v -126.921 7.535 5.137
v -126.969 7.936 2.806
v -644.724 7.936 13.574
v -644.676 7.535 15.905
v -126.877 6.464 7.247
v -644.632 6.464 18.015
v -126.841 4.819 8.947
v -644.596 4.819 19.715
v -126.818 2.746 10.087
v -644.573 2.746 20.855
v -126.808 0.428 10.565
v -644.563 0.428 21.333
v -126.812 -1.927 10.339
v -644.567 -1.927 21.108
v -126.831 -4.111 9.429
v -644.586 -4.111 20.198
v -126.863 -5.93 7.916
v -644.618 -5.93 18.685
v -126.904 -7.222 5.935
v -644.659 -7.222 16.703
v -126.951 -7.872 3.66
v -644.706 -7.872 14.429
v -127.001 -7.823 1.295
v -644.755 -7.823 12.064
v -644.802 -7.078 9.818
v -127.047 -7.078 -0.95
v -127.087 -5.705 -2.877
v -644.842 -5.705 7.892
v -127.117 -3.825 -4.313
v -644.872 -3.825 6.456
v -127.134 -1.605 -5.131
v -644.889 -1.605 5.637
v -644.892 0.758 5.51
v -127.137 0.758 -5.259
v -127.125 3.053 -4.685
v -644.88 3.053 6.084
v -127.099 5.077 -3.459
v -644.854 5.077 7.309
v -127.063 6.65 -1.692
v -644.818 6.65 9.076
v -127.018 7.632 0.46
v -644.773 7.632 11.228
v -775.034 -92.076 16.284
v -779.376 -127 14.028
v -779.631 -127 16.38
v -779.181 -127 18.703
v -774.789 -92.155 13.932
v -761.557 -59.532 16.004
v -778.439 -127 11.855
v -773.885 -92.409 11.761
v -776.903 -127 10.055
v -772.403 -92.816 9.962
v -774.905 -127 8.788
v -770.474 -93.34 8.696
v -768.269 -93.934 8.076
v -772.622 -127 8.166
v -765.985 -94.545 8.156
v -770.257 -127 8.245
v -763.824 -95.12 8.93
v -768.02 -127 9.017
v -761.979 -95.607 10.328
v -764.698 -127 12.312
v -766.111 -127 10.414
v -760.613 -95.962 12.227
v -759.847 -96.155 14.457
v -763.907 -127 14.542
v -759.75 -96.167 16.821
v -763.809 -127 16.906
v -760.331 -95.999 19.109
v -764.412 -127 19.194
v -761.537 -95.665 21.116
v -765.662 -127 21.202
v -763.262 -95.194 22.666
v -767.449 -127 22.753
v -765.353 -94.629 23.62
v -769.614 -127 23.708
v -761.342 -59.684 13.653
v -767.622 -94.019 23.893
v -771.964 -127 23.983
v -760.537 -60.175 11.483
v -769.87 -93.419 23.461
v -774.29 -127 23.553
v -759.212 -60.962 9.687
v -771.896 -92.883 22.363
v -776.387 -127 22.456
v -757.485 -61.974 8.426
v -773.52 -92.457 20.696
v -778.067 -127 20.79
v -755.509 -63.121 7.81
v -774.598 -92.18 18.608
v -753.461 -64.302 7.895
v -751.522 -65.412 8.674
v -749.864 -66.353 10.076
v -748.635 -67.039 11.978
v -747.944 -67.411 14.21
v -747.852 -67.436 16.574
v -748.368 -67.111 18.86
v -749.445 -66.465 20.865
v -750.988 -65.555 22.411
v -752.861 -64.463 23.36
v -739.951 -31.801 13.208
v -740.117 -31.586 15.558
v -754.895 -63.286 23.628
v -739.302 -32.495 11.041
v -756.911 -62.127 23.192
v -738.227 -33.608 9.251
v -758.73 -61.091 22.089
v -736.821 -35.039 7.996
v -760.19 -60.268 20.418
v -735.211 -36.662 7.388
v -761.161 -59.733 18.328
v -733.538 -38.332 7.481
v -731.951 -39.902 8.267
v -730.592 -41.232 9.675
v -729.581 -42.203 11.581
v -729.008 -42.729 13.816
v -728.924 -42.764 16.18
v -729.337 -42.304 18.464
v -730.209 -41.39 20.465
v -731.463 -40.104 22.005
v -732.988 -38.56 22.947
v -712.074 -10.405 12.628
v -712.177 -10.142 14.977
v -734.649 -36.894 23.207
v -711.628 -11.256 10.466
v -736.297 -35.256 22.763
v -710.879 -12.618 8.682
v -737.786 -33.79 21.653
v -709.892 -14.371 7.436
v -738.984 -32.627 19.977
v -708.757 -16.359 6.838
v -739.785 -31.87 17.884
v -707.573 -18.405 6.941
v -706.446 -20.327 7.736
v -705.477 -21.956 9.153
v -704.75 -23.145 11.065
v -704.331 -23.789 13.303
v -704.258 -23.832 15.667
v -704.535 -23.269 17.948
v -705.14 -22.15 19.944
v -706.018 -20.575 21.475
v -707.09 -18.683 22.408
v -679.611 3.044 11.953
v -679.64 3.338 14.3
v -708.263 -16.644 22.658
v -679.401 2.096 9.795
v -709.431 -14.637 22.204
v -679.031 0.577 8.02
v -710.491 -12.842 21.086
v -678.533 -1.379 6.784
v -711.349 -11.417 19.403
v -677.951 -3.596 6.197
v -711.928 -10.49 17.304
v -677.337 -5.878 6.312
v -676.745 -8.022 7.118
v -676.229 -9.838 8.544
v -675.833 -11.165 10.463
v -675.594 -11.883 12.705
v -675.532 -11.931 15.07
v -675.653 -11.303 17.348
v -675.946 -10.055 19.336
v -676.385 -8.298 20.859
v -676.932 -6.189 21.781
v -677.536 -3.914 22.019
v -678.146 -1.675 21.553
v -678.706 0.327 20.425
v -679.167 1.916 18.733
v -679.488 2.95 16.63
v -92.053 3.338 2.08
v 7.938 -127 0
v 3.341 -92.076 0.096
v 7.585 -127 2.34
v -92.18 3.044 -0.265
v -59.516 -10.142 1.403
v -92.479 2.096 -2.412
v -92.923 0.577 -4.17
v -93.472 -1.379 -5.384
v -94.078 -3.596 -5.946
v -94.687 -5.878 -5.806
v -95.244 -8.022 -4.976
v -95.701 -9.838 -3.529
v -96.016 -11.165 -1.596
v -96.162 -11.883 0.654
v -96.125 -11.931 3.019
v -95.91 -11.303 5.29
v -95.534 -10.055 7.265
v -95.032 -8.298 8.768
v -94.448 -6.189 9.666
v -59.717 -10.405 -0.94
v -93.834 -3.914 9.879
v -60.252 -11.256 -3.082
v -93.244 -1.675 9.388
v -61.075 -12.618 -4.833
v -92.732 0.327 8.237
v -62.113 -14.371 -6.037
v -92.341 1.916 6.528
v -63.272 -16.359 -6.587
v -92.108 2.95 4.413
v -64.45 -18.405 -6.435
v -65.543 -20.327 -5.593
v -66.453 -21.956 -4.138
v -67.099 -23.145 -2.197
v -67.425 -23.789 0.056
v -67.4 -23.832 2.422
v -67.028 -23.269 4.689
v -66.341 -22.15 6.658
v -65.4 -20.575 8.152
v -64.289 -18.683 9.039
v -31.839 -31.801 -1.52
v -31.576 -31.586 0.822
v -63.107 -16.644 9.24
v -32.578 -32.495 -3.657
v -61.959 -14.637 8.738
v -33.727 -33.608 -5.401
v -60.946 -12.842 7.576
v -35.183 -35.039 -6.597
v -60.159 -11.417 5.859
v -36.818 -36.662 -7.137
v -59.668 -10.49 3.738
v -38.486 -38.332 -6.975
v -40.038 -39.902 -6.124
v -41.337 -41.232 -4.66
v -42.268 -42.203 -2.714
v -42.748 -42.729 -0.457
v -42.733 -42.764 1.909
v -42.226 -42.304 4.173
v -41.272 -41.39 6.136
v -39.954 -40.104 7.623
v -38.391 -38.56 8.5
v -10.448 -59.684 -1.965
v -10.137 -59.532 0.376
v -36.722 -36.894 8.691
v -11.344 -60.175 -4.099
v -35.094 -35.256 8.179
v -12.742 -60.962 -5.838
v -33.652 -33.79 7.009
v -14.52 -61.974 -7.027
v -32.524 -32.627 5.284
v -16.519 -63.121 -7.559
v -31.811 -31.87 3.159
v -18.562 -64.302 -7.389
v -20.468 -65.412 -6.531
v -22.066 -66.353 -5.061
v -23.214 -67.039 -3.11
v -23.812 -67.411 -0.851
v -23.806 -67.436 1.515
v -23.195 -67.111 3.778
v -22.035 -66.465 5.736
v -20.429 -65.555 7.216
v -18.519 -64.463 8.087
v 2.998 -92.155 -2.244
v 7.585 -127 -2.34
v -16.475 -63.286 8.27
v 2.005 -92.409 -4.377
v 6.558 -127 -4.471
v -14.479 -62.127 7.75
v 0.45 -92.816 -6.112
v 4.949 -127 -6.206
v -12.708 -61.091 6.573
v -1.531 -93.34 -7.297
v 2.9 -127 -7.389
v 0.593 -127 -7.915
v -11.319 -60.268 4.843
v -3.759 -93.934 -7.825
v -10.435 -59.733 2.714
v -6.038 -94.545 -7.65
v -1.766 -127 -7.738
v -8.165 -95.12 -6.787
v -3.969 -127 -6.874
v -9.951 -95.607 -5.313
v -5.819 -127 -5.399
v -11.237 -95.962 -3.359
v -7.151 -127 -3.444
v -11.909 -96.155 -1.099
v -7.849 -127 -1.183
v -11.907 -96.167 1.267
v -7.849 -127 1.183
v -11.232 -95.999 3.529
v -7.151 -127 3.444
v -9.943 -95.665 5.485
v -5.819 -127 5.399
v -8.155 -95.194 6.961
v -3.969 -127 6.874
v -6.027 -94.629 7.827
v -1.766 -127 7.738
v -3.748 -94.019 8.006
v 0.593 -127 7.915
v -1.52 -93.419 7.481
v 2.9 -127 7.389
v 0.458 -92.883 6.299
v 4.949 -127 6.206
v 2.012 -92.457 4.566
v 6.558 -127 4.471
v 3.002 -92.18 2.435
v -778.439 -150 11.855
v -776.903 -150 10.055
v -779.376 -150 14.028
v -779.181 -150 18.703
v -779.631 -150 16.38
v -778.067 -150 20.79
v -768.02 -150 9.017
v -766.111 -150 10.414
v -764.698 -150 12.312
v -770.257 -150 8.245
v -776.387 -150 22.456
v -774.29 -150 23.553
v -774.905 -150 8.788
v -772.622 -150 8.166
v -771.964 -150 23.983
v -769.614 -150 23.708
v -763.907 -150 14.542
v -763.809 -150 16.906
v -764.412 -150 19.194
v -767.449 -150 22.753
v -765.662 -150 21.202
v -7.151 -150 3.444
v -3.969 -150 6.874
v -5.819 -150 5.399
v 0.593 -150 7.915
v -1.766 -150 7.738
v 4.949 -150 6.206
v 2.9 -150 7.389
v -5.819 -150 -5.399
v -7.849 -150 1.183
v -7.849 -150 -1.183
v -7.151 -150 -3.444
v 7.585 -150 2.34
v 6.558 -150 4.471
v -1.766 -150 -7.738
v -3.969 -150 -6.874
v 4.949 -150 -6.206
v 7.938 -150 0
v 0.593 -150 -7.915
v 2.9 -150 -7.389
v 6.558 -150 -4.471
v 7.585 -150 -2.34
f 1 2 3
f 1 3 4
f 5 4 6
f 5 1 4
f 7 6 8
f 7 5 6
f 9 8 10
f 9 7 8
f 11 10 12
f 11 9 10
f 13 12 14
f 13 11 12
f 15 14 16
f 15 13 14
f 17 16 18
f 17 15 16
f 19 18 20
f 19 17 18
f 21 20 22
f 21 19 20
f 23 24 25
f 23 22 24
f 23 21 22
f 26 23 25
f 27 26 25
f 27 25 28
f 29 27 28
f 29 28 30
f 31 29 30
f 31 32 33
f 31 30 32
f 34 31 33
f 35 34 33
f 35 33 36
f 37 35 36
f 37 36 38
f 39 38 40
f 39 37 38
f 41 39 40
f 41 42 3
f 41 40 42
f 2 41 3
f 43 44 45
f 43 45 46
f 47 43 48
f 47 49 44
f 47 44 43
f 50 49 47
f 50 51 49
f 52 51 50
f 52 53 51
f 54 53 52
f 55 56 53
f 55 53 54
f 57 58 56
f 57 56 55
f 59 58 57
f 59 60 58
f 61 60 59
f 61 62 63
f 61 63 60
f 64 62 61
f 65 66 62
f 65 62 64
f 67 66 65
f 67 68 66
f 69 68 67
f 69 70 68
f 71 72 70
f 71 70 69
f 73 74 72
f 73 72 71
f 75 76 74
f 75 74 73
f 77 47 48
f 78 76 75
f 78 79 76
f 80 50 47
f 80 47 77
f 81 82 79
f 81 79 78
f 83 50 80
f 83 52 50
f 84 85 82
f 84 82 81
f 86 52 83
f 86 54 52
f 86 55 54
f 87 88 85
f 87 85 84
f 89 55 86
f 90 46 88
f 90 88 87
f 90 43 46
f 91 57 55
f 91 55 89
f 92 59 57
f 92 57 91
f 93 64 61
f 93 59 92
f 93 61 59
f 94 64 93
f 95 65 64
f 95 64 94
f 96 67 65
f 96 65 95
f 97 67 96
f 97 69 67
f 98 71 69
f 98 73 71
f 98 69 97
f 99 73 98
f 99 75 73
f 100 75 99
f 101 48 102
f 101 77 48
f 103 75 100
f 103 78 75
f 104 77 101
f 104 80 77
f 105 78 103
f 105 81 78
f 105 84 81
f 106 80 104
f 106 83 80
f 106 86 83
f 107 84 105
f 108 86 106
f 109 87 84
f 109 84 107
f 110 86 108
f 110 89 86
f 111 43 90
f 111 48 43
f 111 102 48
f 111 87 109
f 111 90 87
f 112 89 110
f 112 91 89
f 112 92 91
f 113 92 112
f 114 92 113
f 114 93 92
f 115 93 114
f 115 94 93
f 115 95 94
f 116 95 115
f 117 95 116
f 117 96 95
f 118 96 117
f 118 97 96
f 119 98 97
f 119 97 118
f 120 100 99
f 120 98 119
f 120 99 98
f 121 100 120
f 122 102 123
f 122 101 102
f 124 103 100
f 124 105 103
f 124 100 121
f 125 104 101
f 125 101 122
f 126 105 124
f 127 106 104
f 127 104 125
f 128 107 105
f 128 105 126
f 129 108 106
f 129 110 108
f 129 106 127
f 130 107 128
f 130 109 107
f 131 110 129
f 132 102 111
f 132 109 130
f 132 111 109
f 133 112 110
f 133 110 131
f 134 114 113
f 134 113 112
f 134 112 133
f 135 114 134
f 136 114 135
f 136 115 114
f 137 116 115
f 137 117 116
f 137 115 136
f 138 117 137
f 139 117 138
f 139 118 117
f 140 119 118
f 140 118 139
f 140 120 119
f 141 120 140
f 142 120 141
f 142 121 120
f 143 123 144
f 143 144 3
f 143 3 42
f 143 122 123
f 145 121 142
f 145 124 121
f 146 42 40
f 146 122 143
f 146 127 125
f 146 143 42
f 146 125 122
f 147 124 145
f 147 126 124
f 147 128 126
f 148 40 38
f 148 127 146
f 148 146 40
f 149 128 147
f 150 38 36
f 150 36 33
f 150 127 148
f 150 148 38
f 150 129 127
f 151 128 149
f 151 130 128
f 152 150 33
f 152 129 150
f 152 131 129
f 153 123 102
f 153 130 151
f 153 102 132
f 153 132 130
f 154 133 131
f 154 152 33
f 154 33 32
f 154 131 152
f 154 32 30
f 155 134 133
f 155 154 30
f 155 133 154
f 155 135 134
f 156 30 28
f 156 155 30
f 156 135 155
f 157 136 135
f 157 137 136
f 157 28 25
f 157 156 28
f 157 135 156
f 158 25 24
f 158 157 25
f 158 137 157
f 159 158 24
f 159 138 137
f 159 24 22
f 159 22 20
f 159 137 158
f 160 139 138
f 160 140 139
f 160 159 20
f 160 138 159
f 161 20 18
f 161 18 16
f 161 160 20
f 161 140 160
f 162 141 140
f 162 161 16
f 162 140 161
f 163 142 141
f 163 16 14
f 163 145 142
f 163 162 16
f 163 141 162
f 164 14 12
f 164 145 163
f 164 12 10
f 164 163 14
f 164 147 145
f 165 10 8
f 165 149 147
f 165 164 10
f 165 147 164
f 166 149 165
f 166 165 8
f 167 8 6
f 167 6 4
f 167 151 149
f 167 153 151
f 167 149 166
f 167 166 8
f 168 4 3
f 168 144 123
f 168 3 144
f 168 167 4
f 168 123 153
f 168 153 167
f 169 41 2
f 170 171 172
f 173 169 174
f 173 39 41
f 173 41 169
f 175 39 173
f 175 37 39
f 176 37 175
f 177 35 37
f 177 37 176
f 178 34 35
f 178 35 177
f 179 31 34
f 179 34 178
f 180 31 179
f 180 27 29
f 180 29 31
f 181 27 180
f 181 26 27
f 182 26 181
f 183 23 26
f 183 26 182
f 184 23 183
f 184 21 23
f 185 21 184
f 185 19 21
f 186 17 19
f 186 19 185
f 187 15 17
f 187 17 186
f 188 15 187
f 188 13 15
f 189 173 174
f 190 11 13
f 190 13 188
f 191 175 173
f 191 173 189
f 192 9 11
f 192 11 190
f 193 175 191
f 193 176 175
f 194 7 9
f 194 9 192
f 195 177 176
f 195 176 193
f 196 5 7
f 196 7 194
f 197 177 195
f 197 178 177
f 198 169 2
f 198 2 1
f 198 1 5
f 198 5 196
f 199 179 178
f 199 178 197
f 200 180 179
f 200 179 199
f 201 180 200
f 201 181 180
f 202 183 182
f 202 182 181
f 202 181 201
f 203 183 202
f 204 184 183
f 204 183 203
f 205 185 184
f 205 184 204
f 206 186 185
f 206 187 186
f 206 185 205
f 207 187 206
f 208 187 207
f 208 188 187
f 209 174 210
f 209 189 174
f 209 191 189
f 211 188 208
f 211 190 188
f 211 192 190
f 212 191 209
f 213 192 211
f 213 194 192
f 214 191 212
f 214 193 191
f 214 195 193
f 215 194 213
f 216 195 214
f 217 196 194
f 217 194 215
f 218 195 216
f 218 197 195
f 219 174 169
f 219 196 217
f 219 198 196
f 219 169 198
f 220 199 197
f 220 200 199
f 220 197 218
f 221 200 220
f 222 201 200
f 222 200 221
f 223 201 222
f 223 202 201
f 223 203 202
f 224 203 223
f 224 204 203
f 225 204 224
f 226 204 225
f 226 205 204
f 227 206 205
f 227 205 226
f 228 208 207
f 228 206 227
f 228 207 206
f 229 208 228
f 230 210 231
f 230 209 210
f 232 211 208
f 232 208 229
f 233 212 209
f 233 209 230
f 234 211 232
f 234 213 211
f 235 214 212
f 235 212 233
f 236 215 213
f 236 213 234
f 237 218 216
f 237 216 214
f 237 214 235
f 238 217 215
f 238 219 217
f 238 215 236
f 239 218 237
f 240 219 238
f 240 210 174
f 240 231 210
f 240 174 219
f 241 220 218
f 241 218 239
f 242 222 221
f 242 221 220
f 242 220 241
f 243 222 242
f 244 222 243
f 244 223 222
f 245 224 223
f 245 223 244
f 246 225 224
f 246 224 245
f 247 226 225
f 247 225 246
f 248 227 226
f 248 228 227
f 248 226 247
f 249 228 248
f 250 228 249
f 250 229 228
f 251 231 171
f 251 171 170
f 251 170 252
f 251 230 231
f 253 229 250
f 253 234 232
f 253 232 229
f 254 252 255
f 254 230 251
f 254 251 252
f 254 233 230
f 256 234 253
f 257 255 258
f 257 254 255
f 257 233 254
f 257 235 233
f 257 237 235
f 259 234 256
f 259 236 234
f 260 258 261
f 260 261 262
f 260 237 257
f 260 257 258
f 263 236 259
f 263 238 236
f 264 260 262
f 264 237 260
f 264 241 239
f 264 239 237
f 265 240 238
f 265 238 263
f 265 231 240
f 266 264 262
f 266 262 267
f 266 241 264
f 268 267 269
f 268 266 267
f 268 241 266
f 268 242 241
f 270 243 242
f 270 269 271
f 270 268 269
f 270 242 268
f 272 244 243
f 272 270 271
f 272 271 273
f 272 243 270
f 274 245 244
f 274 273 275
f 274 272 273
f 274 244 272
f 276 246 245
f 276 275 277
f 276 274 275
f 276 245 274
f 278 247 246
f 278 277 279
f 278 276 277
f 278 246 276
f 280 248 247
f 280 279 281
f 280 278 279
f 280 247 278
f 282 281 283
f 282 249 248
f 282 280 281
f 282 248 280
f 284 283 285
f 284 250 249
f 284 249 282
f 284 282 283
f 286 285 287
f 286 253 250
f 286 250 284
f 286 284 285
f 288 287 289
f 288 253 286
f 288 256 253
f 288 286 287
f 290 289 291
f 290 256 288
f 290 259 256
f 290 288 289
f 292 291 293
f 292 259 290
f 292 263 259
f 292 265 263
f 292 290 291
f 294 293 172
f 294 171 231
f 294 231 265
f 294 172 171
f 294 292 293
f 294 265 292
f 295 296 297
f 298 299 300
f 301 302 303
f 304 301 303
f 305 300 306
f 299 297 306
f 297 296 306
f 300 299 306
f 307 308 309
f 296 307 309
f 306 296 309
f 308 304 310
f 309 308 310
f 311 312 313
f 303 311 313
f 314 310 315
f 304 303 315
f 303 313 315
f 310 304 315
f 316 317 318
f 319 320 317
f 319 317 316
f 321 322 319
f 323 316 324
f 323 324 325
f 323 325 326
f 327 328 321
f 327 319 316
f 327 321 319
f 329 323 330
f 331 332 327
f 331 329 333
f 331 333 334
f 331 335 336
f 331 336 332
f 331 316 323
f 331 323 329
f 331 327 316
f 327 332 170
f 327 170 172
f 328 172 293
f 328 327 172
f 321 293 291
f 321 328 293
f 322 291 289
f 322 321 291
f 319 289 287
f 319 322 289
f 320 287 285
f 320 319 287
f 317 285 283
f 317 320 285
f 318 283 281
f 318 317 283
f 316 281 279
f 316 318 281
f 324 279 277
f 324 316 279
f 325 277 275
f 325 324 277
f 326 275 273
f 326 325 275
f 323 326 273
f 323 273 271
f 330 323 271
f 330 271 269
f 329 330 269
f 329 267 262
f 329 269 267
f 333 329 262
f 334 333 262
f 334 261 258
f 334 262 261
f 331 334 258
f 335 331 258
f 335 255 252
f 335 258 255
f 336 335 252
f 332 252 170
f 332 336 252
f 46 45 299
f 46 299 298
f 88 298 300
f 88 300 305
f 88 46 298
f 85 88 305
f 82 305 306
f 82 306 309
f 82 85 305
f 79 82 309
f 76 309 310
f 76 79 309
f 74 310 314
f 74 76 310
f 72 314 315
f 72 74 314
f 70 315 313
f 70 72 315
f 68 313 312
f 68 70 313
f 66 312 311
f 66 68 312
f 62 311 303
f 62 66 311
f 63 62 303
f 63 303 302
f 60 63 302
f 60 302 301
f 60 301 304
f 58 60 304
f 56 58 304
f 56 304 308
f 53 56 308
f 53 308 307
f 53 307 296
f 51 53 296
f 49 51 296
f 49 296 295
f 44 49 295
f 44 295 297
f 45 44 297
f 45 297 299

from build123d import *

# Parameters (mm, degrees)
F5_R = 7.9375


with BuildPart() as f6:
    # F6: sweep along a path in F3
    with BuildLine(Plane(origin=(0, 0, 0), x_dir=(0.9997837868, 0, -0.0207937408), z_dir=(-0.0207937408, 0, -0.9997837868))) as f6_path:
        Line((-771.8668878116, 150), (-771.8668878116, 127))
        ThreePointArc((-771.8668878116, 127), (-734.6694490223, 37.1974387893), (-644.8668878116, 0))
        Line((-644.8668878116, 0), (-127, 0))
        ThreePointArc((-127, 0), (-37.1974387893, 37.1974387893), (0, 127))
        Line((0, 127), (0, 150))
    # F5 (on offset) → F6 (sweep)
    with BuildSketch(Plane.XZ.offset(150)):
        Circle(F5_R)
    sweep(path=f6_path.line)


solid = f6.part
